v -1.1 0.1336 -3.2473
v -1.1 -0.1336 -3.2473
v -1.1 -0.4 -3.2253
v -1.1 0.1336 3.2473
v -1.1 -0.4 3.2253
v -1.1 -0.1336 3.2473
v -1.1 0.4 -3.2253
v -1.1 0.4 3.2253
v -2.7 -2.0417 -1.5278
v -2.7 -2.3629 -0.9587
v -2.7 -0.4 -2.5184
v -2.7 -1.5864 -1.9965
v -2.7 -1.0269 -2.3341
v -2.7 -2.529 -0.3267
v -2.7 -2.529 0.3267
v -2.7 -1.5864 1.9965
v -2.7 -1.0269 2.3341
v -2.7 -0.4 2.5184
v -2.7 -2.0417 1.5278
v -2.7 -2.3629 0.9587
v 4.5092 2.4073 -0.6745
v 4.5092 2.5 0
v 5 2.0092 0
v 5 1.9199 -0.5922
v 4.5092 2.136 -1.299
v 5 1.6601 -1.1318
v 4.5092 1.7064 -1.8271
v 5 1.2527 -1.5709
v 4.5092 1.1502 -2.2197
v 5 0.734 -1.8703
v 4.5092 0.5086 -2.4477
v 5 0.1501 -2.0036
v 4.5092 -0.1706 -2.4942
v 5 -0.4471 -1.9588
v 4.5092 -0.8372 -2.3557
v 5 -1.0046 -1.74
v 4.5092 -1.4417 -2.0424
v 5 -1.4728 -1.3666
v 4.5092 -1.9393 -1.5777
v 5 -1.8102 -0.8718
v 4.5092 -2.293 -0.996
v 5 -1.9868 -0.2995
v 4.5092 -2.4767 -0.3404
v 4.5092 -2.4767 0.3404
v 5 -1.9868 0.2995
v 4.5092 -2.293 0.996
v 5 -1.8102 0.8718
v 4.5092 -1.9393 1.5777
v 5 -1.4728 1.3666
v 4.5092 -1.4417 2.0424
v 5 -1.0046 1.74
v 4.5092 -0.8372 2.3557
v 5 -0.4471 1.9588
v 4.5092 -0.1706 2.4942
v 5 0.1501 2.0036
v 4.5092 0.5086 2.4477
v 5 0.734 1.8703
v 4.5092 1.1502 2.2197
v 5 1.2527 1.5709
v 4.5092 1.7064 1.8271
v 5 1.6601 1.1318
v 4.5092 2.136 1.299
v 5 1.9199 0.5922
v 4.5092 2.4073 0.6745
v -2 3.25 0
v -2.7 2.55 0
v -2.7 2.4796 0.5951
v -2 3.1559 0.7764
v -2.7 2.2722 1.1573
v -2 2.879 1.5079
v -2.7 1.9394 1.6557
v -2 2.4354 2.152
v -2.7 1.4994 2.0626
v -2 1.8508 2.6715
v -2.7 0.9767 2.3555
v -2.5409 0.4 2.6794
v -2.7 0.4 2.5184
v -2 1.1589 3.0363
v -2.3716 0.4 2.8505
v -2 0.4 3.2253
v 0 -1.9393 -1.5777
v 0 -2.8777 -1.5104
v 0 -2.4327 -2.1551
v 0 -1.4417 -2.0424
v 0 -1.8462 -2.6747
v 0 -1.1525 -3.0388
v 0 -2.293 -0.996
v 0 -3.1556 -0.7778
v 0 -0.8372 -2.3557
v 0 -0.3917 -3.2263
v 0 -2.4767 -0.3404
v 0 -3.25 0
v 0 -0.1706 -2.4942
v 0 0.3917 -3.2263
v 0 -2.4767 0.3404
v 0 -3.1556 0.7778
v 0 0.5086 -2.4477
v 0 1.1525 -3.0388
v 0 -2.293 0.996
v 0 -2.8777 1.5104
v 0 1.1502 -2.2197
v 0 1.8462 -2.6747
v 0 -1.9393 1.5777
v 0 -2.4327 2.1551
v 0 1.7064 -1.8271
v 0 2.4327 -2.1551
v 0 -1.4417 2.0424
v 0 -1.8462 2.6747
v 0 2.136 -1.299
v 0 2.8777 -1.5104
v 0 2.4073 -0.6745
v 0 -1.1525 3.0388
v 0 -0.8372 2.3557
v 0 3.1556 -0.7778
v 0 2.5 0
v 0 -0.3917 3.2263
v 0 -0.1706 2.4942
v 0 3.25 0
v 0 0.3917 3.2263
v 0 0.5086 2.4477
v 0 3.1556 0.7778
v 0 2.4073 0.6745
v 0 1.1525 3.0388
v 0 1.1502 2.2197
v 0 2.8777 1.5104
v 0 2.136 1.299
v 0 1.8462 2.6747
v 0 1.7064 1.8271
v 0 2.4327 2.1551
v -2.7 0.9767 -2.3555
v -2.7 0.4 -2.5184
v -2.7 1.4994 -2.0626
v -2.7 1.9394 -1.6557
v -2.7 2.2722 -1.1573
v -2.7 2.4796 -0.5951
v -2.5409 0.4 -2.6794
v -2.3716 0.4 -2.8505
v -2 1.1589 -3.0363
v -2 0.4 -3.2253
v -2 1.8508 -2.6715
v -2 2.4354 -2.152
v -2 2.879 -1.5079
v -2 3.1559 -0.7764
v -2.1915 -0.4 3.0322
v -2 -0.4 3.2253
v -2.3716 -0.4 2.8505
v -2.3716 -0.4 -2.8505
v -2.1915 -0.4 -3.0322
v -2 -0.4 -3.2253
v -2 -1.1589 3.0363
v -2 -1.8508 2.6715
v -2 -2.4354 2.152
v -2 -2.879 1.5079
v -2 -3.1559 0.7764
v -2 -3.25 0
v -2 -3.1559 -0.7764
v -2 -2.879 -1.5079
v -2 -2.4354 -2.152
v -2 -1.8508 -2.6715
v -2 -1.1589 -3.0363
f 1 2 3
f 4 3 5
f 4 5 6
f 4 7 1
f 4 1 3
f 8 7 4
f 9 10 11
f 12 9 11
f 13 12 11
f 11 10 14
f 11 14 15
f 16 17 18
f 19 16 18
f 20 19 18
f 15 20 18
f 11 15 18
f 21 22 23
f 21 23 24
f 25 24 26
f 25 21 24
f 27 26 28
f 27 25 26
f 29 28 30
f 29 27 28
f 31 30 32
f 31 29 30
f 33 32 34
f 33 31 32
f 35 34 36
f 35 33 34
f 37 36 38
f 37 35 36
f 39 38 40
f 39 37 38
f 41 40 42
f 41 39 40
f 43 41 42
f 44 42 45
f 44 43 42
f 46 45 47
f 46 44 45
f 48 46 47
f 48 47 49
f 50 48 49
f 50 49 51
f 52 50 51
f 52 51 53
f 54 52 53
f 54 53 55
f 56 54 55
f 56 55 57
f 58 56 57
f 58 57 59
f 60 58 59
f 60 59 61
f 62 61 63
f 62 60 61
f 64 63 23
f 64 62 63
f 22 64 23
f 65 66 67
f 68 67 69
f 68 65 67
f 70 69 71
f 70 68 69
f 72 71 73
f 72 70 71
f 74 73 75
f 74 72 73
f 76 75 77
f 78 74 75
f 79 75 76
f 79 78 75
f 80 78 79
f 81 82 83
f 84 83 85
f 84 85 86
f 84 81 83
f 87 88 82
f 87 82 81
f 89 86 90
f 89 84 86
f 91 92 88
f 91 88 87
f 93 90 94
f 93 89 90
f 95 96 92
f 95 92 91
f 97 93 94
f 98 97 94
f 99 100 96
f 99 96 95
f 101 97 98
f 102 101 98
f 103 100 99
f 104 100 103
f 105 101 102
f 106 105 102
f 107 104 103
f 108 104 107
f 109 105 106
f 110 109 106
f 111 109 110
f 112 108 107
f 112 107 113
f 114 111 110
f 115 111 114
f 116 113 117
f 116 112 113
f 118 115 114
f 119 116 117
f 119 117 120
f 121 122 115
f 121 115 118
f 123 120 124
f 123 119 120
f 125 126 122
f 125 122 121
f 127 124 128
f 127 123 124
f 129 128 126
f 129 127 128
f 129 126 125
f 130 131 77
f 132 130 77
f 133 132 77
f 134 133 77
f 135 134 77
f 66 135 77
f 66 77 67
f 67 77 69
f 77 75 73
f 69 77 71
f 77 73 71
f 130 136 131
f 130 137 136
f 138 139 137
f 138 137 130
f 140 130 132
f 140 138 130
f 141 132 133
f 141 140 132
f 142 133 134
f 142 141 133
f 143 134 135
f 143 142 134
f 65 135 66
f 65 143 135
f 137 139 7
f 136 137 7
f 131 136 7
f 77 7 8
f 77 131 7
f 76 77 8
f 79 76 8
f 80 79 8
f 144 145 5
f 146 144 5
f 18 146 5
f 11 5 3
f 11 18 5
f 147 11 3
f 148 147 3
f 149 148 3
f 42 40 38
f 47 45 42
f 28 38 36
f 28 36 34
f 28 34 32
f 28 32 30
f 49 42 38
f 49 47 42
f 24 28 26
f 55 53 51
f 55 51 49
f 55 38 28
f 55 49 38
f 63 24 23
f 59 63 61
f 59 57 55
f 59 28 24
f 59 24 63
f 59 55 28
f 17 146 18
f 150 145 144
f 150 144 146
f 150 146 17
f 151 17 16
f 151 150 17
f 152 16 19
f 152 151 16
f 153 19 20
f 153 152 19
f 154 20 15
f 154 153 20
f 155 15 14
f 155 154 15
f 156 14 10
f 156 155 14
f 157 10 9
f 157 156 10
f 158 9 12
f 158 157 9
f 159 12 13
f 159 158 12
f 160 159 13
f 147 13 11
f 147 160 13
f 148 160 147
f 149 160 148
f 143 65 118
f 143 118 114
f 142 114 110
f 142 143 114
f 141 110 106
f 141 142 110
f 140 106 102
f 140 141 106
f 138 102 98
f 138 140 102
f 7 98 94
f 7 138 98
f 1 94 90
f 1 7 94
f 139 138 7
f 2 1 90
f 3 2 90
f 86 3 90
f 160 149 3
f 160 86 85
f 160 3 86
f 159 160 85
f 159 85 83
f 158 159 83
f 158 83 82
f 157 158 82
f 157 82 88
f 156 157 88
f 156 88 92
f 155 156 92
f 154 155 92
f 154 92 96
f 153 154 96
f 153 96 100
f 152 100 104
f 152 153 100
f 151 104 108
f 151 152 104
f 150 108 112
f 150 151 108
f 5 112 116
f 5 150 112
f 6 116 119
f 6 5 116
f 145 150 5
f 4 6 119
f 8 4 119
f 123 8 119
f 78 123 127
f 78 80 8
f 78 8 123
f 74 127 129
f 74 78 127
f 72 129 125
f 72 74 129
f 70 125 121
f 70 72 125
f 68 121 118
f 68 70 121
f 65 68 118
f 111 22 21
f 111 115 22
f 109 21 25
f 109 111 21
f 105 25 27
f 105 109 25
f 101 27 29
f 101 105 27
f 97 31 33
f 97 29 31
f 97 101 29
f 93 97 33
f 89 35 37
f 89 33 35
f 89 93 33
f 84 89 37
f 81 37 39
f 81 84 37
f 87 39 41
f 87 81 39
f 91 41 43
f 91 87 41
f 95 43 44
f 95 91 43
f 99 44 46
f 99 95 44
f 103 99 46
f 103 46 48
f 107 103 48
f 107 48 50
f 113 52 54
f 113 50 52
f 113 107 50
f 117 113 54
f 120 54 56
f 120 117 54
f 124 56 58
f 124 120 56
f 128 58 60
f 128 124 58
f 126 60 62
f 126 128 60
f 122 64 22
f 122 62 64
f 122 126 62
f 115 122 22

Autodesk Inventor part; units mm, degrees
ref_plane "YZ Plane" through (0, 0, 0) normal (1, 0, 0) x (0, 1, 0)
ref_plane "XZ Plane" through (0, 0, 0) normal (0, 1, 0) x (-1, 0, 0)
sketch "Sketch1" plane through (0, 0, 0) normal (0, 0, 1) x (1, 0, 0)
  line L0 (-2.7, 0) -> (5, 0)
  line L1 (5, 0) -> (5, 2.5)
  line L2 (5, 2.5) -> (0, 2.5)
  line L3 (0, 2.5) -> (0, 3.25)
  line L4 (0, 3.25) -> (-2.7, 3.25)
  line L5 (-2.7, 3.25) -> (-2.7, 0)
  line L6 (-4.24, 0) -> (6.54, 0) projected
  line L7 (0, -0.65) -> (0, 3.9) projected
  dimension "d0" = 5
  dimension "d1" = 2.7
  dimension "d2" = 5
  dimension "d3" = 6.5
revolve "Body" add sketch "Sketch1" angle 360 about axis through (-2.7, 0, 0) along (1, 0, 0)
sketch "Sketch2" plane through (-2.7, 0, 0) normal (-1, 0, 0) x (0, 0, 1)
  circle A0 centre (0, 0) radius 3.25 projected
  line L0 (-4.55, 0) -> (4.55, 0) projected
  line L1 (0, -4.55) -> (0, 4.55) projected
  line L2 (-3.25, 0.4) -> (3.25, 0.4)
  line L3 (3.25, 0.4) -> (3.25, -0.4)
  line L4 (3.25, -0.4) -> (-3.25, -0.4)
  line L5 (-3.25, -0.4) -> (-3.25, 0.4)
  line L6 (-3.25, 0) -> (3.25, 0) construction
  line L7 (0, 0.4) -> (0, -0.4) construction
  dimension "d5" = 0.8
extrude "Slot" cut sketch "Sketch2" against normal blind 1.6 contours L0 L1 L2 A0 | L3 L4 A0 | A0 L4 L1 L0 | A0 L2 L3 | L1 L4 A0 L0 | L0 A0 L2 L1 | L5 L2 A0 | A0 L4 L5
chamfer "Chamfer1" distance 0.7 angle 45 3 edges at (-2.7, -3.25, 0) (-2.7, 2.4354, -2.152) (-2.7, 2.4354, 2.152) measured on face at (-0.9, -1.3953, 2.9352)
thread "Thread" size "M5x0.8" class "6g" standard "ISO Metric profile" length 3.4
chamfer "Chamfer2" distance 0.4908 distance2 0.4908 1 edges at (5, -2.5, 0) measured on face at (5, 0.9945, 0.5526)
ref_plane "Work Plane1" through (2.5, 0, 0) normal (0, 0, -1) x (1, 0, 0)
equation "\"d0\" = NLG"
equation "\"d1\" = KOH"
equation "\"d2\" = NND"
equation "\"d3\" = KOD"
equation "\"d5\" = SBR"
equation "\"d6\" = STI"
equation "\"d8\" = PHH"
equation "\"d16\" = PHH"
equation "\"d10\" = GEL"
equation "\"d12\" = -0.5 * GD1 + 0.5 * NND"
equation "\"d13\" = GUL"
equation "\"NND\" = 5"
equation "\"NLG\" = 5"
equation "\"GEL\" = 3.4"
equation "\"KOD\" = 6.5"
equation "\"KOH\" = 2.7"
equation "\"STI\" = 1.6"
equation "\"SBR\" = 0.8"
equation "\"GUL\" = 0.61345 * PTC"
equation "\"PHH\" = 0.7"
equation "\"GD1\" = THREADDIA - 1.2269 * PTC"
equation "\"THREADDIA\" = 5"
equation "\"TOA\" = 30deg"
equation "\"PTC\" = 0.8"
equation "\"GAL\" = 0.61345 * PTC"
properties part number "DIN 920 - M5 x 5" material "Steel, Mild"
